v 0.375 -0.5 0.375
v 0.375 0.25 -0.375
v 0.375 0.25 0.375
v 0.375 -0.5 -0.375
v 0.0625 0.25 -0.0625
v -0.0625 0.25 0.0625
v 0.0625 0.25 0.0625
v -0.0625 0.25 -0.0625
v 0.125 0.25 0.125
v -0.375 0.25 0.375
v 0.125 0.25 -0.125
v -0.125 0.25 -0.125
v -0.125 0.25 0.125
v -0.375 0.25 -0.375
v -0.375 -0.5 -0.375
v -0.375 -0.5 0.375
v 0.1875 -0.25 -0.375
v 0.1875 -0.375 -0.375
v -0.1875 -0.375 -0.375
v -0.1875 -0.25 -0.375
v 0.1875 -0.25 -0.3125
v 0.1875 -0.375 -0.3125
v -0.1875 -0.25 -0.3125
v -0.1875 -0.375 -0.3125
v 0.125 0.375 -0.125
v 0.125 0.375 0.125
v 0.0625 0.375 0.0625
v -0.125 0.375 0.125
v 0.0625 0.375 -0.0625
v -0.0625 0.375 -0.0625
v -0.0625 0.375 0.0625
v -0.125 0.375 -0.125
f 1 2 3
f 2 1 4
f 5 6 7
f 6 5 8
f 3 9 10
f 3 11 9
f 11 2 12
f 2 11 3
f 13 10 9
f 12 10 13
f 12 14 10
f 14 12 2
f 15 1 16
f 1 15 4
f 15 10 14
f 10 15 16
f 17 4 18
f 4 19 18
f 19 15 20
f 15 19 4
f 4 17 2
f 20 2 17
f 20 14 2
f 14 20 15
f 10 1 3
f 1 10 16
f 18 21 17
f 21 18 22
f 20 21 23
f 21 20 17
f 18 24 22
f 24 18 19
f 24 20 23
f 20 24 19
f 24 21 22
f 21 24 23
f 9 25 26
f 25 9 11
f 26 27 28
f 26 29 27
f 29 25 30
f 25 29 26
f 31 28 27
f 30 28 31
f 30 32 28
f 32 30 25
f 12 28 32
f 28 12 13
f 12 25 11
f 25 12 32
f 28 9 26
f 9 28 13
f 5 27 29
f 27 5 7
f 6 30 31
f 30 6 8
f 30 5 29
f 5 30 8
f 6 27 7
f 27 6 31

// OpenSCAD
rotate(-90, [1, 0, 0]) {
    translate([0, 0, -2/16])
    difference() {
        cube([12/16, 12/16, 12/16], center = true);
        translate([0, 6/16, -3/16])
        cube([6/16, 2/16, 2/16], center = true);
    }
    translate([0, 0, 5/16])
    difference() {
        cube([4/16, 4/16, 2/16], center = true);
        cube([2/16, 2/16, 3/16], center = true);
    }
}
